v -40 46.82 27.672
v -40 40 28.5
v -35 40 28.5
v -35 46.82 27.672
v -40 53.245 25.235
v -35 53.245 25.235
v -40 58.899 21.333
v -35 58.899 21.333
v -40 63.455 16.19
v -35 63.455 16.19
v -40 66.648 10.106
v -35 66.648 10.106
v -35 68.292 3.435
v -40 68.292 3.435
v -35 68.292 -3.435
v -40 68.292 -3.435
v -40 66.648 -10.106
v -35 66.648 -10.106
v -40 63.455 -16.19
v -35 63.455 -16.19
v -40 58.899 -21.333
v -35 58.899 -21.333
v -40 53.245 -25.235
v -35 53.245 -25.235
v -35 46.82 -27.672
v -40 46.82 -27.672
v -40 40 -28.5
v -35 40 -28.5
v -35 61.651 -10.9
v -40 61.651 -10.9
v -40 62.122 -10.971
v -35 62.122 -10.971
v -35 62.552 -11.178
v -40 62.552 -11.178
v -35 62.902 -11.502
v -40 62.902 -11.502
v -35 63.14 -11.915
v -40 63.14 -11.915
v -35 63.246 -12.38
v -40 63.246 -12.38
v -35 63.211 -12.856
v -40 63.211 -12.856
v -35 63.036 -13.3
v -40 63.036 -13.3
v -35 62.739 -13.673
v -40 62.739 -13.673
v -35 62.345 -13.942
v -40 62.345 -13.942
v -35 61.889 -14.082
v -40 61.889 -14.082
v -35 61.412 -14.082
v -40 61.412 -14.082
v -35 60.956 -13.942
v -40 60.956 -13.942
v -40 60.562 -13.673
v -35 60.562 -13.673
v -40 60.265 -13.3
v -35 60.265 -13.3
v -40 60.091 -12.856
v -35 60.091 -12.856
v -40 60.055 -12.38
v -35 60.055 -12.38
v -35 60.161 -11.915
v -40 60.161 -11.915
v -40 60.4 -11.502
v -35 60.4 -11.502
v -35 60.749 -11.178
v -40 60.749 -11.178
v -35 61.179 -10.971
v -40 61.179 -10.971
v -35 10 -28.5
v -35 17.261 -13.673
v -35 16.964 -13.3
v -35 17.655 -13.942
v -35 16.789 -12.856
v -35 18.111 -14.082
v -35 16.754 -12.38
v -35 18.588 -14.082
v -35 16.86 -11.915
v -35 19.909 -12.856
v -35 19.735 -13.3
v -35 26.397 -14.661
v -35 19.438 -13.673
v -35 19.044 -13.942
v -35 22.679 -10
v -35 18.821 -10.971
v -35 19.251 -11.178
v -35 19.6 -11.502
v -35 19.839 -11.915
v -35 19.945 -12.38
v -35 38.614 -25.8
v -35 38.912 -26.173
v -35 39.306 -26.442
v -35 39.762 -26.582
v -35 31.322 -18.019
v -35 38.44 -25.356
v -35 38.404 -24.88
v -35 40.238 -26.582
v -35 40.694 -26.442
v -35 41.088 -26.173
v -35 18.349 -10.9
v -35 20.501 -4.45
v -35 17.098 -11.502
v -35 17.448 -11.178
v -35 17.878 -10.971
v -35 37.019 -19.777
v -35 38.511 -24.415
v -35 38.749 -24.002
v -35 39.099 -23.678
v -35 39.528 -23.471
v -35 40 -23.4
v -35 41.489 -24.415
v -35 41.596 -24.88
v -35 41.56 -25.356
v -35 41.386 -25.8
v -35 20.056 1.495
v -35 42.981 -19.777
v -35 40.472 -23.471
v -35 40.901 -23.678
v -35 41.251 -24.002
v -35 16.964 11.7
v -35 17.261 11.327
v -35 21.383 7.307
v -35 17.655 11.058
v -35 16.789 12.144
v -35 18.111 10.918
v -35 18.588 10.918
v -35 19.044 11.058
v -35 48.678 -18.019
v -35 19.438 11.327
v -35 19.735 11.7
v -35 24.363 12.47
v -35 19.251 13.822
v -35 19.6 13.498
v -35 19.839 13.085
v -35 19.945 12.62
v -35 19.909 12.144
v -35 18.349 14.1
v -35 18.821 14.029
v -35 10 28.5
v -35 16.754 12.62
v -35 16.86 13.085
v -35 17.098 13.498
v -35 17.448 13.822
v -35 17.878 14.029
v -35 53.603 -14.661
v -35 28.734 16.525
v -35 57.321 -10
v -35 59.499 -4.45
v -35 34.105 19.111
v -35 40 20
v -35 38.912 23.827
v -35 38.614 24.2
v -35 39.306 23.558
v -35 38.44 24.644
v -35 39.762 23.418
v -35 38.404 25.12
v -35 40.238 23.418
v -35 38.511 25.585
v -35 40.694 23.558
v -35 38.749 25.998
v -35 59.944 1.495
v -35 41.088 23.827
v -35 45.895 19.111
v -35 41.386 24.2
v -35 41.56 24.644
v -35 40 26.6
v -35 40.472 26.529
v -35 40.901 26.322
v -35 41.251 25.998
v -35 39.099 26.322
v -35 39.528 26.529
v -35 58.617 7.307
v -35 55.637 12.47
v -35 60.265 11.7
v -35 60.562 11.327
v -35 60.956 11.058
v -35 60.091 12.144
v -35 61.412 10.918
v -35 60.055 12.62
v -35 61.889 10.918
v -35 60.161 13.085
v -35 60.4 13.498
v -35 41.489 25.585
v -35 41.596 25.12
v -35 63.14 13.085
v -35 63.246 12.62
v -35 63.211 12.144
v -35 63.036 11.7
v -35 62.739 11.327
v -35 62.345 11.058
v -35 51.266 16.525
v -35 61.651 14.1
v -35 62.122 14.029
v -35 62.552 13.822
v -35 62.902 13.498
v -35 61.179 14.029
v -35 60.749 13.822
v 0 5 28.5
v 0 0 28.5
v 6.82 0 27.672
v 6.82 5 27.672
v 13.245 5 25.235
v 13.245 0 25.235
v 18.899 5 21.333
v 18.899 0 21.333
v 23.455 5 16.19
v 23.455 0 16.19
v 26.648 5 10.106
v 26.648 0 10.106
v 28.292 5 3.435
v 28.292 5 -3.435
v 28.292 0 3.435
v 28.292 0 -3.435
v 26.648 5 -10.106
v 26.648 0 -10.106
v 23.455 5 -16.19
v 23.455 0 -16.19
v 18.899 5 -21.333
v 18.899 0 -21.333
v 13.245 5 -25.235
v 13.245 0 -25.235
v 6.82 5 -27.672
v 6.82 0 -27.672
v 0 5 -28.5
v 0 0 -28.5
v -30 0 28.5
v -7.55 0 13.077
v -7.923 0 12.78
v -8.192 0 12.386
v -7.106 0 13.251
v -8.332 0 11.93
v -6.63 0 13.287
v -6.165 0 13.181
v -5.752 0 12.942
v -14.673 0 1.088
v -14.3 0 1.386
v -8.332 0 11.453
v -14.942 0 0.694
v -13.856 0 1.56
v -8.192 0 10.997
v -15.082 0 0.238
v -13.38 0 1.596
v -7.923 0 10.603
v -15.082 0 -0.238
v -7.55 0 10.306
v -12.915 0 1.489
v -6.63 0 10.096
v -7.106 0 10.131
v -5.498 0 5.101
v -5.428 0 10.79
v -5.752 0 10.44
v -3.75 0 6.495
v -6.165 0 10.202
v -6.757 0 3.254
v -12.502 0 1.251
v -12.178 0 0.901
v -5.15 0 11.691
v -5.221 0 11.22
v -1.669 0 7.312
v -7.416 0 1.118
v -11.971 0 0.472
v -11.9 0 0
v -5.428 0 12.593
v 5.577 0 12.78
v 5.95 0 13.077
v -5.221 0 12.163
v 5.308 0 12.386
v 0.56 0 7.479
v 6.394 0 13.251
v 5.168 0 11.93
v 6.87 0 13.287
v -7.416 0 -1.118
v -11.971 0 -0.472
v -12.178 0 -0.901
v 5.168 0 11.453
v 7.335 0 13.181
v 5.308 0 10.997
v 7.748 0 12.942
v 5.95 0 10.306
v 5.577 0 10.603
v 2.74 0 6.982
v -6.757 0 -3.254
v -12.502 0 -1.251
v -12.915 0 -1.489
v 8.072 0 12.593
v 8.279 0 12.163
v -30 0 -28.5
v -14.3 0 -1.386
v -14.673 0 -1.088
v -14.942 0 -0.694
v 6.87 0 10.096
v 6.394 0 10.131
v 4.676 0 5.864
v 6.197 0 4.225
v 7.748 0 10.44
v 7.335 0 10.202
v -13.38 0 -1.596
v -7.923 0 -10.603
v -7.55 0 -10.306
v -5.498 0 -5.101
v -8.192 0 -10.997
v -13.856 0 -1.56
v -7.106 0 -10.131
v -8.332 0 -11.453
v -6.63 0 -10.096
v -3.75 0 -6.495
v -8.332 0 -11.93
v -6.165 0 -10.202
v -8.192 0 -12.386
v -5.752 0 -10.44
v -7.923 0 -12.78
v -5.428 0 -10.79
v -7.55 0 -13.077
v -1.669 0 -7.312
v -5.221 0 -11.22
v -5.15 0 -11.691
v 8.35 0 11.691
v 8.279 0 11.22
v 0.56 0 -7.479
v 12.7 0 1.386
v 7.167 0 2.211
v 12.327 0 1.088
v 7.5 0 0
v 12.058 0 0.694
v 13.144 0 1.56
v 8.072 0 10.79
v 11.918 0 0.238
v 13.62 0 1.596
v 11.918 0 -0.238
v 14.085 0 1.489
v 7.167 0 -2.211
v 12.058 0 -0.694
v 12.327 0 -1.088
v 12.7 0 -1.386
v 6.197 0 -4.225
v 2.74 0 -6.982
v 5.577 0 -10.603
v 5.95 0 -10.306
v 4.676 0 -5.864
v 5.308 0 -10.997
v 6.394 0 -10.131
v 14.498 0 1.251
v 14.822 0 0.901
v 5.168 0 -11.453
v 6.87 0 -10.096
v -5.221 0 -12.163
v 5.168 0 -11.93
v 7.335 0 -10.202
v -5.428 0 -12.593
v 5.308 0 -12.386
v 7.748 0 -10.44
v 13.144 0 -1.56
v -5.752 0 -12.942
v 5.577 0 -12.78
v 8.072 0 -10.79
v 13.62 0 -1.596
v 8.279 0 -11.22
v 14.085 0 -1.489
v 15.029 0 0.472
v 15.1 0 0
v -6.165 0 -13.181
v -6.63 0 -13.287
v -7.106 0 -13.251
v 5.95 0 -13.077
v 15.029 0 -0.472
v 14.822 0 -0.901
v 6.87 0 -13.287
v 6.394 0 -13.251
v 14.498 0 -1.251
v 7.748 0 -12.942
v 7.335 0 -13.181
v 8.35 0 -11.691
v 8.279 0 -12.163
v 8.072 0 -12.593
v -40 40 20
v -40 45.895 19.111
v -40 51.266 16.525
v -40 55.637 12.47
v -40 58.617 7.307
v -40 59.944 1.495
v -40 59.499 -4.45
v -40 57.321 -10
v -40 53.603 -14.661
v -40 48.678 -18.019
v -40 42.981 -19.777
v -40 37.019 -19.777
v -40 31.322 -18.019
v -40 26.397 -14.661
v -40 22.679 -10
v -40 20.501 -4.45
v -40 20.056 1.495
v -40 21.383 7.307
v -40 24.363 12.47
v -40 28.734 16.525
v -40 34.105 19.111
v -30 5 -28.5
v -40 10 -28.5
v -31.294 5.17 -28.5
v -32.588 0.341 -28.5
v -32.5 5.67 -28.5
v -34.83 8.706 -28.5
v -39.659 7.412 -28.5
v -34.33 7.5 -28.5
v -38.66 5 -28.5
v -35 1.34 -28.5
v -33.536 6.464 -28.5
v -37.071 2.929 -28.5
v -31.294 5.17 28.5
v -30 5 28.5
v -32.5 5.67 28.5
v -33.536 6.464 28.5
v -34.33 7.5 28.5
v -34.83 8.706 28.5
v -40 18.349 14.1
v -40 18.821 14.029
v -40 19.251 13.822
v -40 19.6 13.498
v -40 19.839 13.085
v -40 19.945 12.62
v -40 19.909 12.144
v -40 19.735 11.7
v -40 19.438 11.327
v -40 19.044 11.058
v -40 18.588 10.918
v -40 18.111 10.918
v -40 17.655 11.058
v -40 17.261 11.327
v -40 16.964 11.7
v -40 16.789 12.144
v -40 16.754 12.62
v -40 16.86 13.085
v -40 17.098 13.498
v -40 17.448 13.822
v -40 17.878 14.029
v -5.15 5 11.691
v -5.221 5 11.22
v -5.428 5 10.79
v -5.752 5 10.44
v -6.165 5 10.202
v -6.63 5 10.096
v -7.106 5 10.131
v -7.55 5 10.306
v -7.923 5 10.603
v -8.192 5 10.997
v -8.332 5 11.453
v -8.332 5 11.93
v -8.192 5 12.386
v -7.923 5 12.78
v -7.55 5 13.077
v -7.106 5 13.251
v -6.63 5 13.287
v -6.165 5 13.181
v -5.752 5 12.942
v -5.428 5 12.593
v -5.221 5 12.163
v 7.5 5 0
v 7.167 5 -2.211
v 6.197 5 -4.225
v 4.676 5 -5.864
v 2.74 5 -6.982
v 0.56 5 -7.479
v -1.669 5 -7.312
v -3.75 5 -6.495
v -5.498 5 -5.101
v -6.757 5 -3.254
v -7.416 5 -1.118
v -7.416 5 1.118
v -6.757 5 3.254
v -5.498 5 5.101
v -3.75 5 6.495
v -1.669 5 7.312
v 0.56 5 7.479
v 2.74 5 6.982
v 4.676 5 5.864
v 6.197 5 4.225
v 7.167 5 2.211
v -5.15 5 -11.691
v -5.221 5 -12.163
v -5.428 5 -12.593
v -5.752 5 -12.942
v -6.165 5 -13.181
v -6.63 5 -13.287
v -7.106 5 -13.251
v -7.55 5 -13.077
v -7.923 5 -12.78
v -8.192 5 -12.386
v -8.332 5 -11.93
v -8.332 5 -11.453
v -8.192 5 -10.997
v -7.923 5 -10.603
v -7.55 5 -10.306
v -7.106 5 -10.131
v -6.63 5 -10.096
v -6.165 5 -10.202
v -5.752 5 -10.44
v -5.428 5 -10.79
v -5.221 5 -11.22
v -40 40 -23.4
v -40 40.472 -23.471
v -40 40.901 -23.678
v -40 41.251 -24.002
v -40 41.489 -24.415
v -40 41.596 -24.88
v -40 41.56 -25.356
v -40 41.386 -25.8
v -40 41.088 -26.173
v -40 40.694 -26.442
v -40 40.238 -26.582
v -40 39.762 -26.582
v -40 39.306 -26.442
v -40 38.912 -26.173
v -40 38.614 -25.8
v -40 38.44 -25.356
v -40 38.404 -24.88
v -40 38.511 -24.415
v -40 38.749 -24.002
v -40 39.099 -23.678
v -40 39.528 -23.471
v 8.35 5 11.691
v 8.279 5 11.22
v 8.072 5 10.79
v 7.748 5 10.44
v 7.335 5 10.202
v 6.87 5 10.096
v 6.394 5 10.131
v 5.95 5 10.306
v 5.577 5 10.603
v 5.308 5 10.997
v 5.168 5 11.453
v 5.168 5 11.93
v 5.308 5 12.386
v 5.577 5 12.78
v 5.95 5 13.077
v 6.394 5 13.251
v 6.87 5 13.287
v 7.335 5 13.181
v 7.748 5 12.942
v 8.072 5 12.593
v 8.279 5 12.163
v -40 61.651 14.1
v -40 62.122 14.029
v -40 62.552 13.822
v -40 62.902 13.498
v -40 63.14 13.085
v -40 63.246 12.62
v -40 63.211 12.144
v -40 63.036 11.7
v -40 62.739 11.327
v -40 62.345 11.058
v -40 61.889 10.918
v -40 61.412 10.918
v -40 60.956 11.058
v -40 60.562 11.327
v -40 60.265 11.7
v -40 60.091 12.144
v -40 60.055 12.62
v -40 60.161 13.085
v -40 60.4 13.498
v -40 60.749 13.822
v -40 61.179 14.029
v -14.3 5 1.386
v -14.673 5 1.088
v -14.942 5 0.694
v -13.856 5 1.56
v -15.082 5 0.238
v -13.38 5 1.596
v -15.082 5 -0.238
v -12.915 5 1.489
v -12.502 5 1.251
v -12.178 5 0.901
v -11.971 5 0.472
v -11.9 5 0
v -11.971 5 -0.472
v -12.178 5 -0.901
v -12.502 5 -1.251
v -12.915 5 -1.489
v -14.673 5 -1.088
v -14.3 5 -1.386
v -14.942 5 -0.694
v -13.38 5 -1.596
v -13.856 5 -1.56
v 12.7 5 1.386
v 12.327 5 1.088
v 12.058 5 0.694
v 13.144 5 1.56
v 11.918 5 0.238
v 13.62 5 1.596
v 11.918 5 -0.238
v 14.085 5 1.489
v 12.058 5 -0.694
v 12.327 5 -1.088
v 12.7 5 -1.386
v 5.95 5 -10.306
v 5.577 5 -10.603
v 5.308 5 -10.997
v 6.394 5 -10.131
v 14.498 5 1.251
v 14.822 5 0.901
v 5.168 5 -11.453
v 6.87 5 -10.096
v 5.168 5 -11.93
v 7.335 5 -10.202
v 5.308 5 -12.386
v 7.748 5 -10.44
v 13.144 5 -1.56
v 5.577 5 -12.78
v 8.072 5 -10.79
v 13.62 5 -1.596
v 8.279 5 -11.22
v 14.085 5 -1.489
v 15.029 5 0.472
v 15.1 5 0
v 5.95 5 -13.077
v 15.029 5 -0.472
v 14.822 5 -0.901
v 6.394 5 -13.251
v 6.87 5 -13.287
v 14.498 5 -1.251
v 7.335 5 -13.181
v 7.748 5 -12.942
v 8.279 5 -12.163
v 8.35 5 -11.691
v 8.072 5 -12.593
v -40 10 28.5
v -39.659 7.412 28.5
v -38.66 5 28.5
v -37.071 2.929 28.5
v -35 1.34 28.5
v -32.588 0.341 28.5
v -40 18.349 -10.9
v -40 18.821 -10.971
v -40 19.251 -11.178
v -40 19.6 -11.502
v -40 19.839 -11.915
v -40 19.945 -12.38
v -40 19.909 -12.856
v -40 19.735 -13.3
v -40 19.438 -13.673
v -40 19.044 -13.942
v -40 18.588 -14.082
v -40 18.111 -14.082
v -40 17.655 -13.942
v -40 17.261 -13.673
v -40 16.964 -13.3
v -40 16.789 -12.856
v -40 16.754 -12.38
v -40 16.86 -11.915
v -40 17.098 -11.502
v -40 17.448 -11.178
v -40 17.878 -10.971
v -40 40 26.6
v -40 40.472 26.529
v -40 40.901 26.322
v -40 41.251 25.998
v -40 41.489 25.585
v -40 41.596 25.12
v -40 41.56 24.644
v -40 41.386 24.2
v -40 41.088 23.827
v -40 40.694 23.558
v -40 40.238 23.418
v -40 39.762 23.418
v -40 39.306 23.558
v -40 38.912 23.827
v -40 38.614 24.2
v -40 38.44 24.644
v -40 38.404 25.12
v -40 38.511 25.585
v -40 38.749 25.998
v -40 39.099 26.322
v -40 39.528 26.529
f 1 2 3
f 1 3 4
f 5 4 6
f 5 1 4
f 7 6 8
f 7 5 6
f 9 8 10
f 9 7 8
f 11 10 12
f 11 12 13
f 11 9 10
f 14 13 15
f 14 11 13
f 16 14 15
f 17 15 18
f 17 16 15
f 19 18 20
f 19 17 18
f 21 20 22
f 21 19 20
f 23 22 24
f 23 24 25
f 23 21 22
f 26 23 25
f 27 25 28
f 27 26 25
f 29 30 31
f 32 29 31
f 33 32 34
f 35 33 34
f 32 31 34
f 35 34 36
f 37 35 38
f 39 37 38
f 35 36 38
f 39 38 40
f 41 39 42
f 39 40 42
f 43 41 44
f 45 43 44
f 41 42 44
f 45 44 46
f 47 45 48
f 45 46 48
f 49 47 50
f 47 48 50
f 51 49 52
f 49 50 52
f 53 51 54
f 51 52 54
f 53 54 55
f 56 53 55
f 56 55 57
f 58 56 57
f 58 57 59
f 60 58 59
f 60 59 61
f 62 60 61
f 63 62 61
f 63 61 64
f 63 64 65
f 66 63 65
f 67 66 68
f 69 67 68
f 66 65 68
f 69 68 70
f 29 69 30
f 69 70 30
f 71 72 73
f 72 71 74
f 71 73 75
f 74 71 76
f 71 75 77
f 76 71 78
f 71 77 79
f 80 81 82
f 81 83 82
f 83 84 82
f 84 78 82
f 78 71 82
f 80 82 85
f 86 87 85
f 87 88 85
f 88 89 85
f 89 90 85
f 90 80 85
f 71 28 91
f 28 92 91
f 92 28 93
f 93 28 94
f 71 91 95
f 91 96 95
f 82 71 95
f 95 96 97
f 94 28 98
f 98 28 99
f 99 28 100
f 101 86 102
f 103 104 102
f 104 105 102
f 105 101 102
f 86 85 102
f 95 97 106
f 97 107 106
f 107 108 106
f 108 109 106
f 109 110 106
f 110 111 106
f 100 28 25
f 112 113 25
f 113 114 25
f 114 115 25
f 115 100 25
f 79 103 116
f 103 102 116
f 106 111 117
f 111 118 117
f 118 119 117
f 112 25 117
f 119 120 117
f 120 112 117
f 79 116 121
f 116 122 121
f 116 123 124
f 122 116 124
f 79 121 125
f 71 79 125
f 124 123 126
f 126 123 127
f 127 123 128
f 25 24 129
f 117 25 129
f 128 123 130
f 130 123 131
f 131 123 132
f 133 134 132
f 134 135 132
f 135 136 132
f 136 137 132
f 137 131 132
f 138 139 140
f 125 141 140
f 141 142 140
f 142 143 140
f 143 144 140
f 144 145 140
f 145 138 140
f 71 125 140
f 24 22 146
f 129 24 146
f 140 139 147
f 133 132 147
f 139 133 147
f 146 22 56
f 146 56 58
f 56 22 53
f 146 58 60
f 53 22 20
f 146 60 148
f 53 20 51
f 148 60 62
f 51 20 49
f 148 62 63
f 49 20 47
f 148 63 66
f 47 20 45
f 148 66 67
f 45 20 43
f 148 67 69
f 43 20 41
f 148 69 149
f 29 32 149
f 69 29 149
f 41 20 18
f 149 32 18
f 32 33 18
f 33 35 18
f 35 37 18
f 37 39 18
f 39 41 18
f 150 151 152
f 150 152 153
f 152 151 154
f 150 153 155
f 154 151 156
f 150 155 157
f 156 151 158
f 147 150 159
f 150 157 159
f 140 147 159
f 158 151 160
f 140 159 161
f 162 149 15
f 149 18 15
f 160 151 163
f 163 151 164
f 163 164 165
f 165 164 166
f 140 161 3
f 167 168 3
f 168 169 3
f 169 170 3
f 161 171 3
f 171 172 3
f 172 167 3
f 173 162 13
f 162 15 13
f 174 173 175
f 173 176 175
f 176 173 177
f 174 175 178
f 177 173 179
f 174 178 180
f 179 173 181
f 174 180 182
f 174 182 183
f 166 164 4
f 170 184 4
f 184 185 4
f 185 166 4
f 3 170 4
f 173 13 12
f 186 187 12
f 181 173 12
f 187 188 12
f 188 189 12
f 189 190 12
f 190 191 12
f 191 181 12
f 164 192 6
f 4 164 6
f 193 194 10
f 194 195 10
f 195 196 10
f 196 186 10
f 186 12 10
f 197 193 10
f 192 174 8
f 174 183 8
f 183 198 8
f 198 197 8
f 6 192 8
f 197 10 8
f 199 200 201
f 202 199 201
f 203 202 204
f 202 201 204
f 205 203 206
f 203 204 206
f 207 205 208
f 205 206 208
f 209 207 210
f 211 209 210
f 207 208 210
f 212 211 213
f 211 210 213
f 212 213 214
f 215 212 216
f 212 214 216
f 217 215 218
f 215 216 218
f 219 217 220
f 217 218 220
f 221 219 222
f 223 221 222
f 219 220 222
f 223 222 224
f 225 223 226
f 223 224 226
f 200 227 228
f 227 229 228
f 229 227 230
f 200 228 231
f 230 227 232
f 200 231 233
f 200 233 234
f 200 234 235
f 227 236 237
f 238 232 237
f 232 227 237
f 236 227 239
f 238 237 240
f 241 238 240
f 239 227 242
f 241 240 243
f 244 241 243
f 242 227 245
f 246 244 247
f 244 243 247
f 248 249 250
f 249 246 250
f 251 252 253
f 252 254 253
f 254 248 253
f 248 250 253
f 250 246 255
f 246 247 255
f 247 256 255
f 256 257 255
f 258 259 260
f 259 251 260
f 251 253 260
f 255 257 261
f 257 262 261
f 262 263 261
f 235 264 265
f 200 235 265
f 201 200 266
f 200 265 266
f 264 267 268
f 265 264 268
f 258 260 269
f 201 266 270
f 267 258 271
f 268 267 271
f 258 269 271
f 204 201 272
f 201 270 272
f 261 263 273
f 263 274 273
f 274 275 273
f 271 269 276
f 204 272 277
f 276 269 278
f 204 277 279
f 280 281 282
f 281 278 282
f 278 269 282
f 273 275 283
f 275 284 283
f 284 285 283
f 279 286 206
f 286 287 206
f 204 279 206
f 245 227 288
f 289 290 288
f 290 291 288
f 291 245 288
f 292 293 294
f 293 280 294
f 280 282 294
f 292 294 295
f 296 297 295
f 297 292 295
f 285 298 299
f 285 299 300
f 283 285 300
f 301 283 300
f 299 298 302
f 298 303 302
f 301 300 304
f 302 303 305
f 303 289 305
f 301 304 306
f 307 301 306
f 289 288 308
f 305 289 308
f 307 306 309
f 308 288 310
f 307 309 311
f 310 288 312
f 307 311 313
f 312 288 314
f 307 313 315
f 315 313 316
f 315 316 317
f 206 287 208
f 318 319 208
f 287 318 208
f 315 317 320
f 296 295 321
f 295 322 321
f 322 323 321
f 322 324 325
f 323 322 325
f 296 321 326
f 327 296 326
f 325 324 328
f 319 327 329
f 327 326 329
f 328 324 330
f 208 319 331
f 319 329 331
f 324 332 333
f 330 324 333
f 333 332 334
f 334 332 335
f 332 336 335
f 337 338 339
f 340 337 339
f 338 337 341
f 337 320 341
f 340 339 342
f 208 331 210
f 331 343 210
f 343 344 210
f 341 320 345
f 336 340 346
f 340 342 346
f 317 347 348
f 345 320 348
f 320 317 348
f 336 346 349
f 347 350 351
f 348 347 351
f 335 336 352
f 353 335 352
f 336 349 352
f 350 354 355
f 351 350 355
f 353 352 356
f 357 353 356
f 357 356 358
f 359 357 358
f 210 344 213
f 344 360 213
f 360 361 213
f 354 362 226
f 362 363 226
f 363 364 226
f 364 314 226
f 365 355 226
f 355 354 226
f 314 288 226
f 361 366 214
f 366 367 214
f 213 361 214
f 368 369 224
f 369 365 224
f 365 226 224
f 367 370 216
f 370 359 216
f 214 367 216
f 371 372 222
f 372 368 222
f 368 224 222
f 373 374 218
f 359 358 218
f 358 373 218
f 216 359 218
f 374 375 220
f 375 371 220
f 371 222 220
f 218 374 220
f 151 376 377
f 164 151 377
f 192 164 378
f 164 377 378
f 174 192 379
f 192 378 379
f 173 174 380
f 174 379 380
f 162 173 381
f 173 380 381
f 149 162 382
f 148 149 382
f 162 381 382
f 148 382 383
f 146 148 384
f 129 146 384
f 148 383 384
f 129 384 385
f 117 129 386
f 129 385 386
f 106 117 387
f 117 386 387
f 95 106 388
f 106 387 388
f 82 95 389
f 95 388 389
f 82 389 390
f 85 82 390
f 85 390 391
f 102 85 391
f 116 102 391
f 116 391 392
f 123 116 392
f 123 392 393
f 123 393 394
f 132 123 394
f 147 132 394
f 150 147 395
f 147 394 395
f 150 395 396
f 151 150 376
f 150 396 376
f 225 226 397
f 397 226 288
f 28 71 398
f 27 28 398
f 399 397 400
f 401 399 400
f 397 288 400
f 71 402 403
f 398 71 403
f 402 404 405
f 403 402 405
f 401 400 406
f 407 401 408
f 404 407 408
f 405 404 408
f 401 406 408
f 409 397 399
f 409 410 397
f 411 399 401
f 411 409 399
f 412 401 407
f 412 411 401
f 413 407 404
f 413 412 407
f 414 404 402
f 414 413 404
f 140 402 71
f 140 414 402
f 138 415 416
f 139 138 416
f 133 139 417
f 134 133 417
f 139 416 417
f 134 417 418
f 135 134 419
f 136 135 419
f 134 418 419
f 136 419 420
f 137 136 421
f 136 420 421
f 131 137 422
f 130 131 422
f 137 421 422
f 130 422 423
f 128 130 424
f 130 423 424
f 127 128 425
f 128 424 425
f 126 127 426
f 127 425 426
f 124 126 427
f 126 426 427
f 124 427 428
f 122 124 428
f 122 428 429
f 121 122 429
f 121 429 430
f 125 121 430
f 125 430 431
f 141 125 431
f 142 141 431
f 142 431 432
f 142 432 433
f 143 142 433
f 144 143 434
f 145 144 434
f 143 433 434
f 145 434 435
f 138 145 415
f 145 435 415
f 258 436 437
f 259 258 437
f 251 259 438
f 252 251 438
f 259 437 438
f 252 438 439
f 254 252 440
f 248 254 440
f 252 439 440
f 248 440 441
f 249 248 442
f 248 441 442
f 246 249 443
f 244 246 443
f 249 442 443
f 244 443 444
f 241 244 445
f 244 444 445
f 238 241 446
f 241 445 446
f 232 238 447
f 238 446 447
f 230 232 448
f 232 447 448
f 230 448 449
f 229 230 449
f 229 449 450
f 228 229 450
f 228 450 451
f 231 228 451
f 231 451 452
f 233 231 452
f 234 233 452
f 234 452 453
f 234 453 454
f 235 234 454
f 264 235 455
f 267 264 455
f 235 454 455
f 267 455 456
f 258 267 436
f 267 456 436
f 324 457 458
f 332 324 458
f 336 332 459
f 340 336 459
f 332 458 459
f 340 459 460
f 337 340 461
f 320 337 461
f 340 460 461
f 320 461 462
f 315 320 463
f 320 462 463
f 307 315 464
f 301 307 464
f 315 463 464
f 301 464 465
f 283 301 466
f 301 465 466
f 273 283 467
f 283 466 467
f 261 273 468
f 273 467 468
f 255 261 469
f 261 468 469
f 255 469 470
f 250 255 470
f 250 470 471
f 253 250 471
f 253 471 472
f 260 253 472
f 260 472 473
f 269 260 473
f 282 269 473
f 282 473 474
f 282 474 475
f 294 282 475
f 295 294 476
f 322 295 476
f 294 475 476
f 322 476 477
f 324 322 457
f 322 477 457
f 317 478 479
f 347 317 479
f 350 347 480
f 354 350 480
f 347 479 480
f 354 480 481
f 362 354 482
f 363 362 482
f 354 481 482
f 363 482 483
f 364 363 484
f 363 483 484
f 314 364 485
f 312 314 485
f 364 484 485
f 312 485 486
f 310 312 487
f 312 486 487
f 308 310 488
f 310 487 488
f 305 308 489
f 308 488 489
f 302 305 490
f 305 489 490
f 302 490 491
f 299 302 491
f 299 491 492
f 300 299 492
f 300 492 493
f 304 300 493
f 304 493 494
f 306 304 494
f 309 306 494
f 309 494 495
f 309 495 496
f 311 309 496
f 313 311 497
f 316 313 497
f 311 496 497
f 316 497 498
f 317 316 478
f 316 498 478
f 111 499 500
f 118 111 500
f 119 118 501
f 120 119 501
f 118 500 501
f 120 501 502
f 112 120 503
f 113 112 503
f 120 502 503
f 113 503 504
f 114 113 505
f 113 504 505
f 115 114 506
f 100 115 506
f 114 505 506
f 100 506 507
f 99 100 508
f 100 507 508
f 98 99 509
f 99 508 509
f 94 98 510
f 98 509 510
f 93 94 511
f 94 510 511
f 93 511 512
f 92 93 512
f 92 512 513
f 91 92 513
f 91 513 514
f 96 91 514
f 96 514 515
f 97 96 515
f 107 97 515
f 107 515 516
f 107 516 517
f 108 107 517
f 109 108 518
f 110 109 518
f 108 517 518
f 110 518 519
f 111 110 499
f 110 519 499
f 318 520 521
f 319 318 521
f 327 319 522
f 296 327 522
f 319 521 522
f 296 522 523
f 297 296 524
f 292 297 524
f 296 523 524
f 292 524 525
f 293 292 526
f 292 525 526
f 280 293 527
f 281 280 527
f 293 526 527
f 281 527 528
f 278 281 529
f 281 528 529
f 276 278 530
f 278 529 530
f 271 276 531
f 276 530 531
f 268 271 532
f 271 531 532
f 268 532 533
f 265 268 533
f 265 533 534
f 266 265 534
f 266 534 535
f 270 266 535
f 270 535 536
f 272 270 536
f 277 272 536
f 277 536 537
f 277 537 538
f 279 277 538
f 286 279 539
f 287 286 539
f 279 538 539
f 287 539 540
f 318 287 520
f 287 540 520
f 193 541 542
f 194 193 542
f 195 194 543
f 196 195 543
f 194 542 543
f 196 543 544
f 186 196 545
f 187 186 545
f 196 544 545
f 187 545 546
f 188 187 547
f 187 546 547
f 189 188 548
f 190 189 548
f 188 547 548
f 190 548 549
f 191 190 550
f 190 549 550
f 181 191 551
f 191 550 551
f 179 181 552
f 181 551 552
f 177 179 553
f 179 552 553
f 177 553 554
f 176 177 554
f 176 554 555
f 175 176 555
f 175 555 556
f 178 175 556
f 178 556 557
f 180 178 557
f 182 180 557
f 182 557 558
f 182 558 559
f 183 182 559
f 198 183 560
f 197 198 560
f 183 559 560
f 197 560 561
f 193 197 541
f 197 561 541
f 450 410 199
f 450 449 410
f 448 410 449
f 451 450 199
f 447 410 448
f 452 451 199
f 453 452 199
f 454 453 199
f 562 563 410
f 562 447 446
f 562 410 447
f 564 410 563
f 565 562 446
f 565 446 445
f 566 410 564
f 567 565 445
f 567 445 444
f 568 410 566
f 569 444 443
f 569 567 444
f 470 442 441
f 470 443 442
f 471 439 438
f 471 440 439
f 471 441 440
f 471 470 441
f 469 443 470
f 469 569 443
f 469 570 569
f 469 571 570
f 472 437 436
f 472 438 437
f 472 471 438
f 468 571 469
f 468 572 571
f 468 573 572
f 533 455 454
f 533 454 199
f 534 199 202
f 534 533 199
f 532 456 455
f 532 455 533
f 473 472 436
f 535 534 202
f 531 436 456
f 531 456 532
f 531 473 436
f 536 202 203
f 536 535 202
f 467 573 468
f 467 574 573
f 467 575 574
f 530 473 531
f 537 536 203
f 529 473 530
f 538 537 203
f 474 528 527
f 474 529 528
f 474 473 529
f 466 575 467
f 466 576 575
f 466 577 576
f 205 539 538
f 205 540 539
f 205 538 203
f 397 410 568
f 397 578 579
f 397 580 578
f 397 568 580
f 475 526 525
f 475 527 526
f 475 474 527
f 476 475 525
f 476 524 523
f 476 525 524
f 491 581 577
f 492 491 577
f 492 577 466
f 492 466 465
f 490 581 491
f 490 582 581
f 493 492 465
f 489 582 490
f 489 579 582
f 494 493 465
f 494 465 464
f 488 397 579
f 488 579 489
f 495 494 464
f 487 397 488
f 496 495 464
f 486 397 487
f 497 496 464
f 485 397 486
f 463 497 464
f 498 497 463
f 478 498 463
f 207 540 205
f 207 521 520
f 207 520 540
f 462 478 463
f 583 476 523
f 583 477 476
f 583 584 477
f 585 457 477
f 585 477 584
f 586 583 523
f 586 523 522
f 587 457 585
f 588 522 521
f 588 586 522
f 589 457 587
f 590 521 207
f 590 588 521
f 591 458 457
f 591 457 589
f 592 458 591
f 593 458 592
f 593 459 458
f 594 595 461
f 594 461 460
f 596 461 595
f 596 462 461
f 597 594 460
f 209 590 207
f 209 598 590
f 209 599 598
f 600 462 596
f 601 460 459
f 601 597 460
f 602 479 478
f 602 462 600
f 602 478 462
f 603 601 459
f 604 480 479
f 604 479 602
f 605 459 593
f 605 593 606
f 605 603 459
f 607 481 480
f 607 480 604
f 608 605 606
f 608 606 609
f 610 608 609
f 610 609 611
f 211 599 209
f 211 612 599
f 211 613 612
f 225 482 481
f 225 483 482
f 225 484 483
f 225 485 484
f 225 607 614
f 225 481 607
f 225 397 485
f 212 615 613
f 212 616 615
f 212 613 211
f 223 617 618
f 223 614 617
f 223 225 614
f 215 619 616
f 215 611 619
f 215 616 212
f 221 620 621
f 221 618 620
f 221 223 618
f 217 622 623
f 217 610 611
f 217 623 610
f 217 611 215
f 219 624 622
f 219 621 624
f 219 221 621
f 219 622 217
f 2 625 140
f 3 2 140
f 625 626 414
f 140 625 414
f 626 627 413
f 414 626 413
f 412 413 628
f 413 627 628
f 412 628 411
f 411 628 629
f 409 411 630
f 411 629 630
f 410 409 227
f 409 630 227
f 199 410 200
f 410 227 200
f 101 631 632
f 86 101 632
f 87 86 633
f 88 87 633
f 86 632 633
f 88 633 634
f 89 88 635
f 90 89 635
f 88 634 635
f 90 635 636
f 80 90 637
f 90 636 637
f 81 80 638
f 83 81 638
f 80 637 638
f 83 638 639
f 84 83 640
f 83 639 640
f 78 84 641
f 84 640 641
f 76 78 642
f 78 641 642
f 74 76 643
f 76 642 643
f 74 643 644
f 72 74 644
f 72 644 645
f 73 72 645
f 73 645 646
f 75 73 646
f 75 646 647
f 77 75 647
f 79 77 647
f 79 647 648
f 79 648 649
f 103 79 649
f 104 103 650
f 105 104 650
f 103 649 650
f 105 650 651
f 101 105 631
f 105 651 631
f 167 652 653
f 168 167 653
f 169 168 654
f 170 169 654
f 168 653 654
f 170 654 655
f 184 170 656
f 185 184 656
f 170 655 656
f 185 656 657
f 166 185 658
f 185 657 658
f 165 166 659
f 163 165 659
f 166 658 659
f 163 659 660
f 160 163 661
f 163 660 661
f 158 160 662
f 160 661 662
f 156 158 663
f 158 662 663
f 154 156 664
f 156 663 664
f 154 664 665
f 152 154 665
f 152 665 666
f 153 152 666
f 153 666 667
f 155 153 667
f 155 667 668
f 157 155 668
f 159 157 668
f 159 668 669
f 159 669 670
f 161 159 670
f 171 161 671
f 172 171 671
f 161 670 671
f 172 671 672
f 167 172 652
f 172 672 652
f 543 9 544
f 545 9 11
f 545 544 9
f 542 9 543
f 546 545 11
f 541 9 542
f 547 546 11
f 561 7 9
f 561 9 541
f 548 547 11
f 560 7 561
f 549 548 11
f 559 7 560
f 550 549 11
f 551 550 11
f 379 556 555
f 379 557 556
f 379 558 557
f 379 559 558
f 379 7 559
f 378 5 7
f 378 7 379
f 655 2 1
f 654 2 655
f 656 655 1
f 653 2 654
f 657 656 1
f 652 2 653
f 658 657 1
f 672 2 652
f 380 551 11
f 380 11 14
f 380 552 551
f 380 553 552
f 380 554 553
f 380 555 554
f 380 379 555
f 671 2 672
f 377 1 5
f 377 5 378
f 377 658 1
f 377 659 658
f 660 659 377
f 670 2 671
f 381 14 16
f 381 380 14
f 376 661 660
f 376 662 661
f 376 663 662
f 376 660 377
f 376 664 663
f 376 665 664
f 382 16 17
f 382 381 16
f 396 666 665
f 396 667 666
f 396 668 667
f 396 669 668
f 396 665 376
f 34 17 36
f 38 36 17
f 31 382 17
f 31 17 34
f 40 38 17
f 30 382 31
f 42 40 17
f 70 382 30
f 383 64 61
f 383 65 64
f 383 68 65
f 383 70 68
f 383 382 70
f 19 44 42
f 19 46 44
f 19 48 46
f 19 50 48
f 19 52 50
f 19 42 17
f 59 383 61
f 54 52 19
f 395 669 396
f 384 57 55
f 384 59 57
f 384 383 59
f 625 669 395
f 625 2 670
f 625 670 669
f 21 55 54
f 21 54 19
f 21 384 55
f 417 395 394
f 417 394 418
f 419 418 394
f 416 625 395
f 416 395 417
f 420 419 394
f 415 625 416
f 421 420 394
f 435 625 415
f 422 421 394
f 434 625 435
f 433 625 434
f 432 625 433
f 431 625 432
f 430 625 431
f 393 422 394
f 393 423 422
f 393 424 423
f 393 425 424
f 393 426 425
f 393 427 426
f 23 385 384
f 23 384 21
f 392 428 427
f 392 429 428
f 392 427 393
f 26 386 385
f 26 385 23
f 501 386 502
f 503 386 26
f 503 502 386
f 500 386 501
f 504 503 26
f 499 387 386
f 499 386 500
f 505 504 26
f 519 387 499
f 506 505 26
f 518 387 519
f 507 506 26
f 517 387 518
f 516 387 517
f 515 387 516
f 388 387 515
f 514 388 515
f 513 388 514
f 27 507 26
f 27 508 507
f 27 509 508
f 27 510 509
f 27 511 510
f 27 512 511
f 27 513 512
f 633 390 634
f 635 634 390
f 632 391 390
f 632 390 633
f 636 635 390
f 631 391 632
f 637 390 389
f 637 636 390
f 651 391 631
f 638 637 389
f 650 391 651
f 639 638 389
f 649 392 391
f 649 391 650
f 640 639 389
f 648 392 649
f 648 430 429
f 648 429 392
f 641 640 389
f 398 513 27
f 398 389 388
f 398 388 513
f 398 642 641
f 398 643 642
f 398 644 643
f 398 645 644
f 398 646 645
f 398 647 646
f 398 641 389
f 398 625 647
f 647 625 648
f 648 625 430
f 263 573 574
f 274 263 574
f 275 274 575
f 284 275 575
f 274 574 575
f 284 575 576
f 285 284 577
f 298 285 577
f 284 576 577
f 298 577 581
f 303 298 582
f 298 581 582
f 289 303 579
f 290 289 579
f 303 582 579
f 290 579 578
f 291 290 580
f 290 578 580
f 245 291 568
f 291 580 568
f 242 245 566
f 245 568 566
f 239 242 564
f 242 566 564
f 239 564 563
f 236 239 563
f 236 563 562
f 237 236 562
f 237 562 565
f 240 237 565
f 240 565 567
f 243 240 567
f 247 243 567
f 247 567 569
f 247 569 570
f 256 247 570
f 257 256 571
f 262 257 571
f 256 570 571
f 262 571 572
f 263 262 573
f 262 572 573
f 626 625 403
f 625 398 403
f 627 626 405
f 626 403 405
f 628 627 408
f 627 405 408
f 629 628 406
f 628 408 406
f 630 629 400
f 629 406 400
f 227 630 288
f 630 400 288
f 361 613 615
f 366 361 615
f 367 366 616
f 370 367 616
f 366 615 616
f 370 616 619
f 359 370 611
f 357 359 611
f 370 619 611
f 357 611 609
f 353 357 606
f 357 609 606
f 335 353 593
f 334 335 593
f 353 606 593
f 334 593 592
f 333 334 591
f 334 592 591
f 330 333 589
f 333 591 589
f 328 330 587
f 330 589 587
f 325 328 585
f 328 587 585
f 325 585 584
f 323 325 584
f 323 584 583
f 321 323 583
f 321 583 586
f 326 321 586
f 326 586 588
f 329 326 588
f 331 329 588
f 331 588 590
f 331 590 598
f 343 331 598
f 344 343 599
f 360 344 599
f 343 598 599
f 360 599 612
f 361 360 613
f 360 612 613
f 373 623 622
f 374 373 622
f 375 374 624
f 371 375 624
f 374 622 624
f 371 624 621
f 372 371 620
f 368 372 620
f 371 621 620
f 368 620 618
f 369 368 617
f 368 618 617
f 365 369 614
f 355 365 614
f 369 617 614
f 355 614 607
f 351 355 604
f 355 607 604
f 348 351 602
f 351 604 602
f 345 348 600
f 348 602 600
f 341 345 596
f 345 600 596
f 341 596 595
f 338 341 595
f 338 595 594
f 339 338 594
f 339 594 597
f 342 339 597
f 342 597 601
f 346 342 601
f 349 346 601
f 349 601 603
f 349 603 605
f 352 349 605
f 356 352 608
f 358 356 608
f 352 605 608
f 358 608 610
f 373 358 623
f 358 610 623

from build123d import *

# Parameters (mm, degrees)
SKETCH_1_R          = 28.5
SKETCH_1_W          = 5
SKETCH_1_H          = 57
EXTRUDE_1_DEPTH     = 5
SKETCH_2_R          = 1.6
SKETCH_2_R_2        = 20
EXTRUDE_2_DEPTH     = 5
FILLET_1_R          = 10
FILLET_2_R          = 5
SKETCH_3_R          = 1.6
SKETCH_3_R_2        = 7.5
CUT_EXTRUDE_1_DEPTH = 5


with BuildPart() as part:
    # 草图1 → 凸台-拉伸1 (new body)
    with BuildSketch(Plane(origin=(0, 0, 0), x_dir=(1, 0, 0), z_dir=(0, 1, 0))):
        with BuildLine():
            ThreePointArc((0, -28.5), (-28.5, 0), (0, 28.5))
            Line((0, 28.5), (-35, 28.5))
            Line((-35, 28.5), (-35, -28.5))
            Line((-35, -28.5), (0, -28.5))
        make_face()
        Circle(SKETCH_1_R)
        with Locations((-37.5, 0)):
            Rectangle(SKETCH_1_W, SKETCH_1_H)
    extrude(amount=EXTRUDE_1_DEPTH)

    # 草图2 → 凸台-拉伸2 (add)
    with BuildSketch(Plane.ZY.offset(40)):
        with BuildLine():
            Line((28.5, 0), (28.5, 40))
            ThreePointArc((28.5, 40), (0, 68.5), (-28.5, 40))
            Line((-28.5, 40), (-28.5, 0))
            Line((-28.5, 0), (28.5, 0))
        make_face()
        with Locations((12.5, 61.650635095)):
            Circle(SKETCH_2_R, mode=Mode.SUBTRACT)
        with Locations((-12.5, 18.349364905)):
            Circle(SKETCH_2_R, mode=Mode.SUBTRACT)
        with Locations((12.5, 18.349364905)):
            Circle(SKETCH_2_R, mode=Mode.SUBTRACT)
        with Locations((-25, 40)):
            Circle(SKETCH_2_R, mode=Mode.SUBTRACT)
        with Locations((-12.5, 61.650635095)):
            Circle(SKETCH_2_R, mode=Mode.SUBTRACT)
        with Locations((0, 40)):
            Circle(SKETCH_2_R_2, mode=Mode.SUBTRACT)
        with Locations((25, 40)):
            Circle(SKETCH_2_R, mode=Mode.SUBTRACT)
    extrude(amount=-EXTRUDE_2_DEPTH)

    # 圆角1
    fillet_1_edges = [part.edges().sort_by_distance(p)[0] for p in [
        (-40, 0, 0),
    ]]
    fillet(fillet_1_edges, radius=FILLET_1_R)

    # 圆角2
    fillet_2_edges = [part.edges().sort_by_distance(p)[0] for p in [
        (-35, 5, 0),
    ]]
    fillet(fillet_2_edges, radius=FILLET_2_R)

    # 草图3 → 切除-拉伸1 (cut)
    with BuildSketch(Plane(origin=(0, 5, 0), x_dir=(1, 0, 0), z_dir=(0, 1, 0))):
        with Locations((13.5, 0)):
            Circle(SKETCH_3_R)
        with Locations((6.75, -11.691342951)):
            Circle(SKETCH_3_R)
        with Locations((-6.75, -11.691342951)):
            Circle(SKETCH_3_R)
        with Locations((-13.5, 0)):
            Circle(SKETCH_3_R)
        with Locations((-6.75, 11.691342951)):
            Circle(SKETCH_3_R)
        with Locations((6.75, 11.691342951)):
            Circle(SKETCH_3_R)
        Circle(SKETCH_3_R_2)
    extrude(amount=-CUT_EXTRUDE_1_DEPTH, mode=Mode.SUBTRACT)


solid = part.part
